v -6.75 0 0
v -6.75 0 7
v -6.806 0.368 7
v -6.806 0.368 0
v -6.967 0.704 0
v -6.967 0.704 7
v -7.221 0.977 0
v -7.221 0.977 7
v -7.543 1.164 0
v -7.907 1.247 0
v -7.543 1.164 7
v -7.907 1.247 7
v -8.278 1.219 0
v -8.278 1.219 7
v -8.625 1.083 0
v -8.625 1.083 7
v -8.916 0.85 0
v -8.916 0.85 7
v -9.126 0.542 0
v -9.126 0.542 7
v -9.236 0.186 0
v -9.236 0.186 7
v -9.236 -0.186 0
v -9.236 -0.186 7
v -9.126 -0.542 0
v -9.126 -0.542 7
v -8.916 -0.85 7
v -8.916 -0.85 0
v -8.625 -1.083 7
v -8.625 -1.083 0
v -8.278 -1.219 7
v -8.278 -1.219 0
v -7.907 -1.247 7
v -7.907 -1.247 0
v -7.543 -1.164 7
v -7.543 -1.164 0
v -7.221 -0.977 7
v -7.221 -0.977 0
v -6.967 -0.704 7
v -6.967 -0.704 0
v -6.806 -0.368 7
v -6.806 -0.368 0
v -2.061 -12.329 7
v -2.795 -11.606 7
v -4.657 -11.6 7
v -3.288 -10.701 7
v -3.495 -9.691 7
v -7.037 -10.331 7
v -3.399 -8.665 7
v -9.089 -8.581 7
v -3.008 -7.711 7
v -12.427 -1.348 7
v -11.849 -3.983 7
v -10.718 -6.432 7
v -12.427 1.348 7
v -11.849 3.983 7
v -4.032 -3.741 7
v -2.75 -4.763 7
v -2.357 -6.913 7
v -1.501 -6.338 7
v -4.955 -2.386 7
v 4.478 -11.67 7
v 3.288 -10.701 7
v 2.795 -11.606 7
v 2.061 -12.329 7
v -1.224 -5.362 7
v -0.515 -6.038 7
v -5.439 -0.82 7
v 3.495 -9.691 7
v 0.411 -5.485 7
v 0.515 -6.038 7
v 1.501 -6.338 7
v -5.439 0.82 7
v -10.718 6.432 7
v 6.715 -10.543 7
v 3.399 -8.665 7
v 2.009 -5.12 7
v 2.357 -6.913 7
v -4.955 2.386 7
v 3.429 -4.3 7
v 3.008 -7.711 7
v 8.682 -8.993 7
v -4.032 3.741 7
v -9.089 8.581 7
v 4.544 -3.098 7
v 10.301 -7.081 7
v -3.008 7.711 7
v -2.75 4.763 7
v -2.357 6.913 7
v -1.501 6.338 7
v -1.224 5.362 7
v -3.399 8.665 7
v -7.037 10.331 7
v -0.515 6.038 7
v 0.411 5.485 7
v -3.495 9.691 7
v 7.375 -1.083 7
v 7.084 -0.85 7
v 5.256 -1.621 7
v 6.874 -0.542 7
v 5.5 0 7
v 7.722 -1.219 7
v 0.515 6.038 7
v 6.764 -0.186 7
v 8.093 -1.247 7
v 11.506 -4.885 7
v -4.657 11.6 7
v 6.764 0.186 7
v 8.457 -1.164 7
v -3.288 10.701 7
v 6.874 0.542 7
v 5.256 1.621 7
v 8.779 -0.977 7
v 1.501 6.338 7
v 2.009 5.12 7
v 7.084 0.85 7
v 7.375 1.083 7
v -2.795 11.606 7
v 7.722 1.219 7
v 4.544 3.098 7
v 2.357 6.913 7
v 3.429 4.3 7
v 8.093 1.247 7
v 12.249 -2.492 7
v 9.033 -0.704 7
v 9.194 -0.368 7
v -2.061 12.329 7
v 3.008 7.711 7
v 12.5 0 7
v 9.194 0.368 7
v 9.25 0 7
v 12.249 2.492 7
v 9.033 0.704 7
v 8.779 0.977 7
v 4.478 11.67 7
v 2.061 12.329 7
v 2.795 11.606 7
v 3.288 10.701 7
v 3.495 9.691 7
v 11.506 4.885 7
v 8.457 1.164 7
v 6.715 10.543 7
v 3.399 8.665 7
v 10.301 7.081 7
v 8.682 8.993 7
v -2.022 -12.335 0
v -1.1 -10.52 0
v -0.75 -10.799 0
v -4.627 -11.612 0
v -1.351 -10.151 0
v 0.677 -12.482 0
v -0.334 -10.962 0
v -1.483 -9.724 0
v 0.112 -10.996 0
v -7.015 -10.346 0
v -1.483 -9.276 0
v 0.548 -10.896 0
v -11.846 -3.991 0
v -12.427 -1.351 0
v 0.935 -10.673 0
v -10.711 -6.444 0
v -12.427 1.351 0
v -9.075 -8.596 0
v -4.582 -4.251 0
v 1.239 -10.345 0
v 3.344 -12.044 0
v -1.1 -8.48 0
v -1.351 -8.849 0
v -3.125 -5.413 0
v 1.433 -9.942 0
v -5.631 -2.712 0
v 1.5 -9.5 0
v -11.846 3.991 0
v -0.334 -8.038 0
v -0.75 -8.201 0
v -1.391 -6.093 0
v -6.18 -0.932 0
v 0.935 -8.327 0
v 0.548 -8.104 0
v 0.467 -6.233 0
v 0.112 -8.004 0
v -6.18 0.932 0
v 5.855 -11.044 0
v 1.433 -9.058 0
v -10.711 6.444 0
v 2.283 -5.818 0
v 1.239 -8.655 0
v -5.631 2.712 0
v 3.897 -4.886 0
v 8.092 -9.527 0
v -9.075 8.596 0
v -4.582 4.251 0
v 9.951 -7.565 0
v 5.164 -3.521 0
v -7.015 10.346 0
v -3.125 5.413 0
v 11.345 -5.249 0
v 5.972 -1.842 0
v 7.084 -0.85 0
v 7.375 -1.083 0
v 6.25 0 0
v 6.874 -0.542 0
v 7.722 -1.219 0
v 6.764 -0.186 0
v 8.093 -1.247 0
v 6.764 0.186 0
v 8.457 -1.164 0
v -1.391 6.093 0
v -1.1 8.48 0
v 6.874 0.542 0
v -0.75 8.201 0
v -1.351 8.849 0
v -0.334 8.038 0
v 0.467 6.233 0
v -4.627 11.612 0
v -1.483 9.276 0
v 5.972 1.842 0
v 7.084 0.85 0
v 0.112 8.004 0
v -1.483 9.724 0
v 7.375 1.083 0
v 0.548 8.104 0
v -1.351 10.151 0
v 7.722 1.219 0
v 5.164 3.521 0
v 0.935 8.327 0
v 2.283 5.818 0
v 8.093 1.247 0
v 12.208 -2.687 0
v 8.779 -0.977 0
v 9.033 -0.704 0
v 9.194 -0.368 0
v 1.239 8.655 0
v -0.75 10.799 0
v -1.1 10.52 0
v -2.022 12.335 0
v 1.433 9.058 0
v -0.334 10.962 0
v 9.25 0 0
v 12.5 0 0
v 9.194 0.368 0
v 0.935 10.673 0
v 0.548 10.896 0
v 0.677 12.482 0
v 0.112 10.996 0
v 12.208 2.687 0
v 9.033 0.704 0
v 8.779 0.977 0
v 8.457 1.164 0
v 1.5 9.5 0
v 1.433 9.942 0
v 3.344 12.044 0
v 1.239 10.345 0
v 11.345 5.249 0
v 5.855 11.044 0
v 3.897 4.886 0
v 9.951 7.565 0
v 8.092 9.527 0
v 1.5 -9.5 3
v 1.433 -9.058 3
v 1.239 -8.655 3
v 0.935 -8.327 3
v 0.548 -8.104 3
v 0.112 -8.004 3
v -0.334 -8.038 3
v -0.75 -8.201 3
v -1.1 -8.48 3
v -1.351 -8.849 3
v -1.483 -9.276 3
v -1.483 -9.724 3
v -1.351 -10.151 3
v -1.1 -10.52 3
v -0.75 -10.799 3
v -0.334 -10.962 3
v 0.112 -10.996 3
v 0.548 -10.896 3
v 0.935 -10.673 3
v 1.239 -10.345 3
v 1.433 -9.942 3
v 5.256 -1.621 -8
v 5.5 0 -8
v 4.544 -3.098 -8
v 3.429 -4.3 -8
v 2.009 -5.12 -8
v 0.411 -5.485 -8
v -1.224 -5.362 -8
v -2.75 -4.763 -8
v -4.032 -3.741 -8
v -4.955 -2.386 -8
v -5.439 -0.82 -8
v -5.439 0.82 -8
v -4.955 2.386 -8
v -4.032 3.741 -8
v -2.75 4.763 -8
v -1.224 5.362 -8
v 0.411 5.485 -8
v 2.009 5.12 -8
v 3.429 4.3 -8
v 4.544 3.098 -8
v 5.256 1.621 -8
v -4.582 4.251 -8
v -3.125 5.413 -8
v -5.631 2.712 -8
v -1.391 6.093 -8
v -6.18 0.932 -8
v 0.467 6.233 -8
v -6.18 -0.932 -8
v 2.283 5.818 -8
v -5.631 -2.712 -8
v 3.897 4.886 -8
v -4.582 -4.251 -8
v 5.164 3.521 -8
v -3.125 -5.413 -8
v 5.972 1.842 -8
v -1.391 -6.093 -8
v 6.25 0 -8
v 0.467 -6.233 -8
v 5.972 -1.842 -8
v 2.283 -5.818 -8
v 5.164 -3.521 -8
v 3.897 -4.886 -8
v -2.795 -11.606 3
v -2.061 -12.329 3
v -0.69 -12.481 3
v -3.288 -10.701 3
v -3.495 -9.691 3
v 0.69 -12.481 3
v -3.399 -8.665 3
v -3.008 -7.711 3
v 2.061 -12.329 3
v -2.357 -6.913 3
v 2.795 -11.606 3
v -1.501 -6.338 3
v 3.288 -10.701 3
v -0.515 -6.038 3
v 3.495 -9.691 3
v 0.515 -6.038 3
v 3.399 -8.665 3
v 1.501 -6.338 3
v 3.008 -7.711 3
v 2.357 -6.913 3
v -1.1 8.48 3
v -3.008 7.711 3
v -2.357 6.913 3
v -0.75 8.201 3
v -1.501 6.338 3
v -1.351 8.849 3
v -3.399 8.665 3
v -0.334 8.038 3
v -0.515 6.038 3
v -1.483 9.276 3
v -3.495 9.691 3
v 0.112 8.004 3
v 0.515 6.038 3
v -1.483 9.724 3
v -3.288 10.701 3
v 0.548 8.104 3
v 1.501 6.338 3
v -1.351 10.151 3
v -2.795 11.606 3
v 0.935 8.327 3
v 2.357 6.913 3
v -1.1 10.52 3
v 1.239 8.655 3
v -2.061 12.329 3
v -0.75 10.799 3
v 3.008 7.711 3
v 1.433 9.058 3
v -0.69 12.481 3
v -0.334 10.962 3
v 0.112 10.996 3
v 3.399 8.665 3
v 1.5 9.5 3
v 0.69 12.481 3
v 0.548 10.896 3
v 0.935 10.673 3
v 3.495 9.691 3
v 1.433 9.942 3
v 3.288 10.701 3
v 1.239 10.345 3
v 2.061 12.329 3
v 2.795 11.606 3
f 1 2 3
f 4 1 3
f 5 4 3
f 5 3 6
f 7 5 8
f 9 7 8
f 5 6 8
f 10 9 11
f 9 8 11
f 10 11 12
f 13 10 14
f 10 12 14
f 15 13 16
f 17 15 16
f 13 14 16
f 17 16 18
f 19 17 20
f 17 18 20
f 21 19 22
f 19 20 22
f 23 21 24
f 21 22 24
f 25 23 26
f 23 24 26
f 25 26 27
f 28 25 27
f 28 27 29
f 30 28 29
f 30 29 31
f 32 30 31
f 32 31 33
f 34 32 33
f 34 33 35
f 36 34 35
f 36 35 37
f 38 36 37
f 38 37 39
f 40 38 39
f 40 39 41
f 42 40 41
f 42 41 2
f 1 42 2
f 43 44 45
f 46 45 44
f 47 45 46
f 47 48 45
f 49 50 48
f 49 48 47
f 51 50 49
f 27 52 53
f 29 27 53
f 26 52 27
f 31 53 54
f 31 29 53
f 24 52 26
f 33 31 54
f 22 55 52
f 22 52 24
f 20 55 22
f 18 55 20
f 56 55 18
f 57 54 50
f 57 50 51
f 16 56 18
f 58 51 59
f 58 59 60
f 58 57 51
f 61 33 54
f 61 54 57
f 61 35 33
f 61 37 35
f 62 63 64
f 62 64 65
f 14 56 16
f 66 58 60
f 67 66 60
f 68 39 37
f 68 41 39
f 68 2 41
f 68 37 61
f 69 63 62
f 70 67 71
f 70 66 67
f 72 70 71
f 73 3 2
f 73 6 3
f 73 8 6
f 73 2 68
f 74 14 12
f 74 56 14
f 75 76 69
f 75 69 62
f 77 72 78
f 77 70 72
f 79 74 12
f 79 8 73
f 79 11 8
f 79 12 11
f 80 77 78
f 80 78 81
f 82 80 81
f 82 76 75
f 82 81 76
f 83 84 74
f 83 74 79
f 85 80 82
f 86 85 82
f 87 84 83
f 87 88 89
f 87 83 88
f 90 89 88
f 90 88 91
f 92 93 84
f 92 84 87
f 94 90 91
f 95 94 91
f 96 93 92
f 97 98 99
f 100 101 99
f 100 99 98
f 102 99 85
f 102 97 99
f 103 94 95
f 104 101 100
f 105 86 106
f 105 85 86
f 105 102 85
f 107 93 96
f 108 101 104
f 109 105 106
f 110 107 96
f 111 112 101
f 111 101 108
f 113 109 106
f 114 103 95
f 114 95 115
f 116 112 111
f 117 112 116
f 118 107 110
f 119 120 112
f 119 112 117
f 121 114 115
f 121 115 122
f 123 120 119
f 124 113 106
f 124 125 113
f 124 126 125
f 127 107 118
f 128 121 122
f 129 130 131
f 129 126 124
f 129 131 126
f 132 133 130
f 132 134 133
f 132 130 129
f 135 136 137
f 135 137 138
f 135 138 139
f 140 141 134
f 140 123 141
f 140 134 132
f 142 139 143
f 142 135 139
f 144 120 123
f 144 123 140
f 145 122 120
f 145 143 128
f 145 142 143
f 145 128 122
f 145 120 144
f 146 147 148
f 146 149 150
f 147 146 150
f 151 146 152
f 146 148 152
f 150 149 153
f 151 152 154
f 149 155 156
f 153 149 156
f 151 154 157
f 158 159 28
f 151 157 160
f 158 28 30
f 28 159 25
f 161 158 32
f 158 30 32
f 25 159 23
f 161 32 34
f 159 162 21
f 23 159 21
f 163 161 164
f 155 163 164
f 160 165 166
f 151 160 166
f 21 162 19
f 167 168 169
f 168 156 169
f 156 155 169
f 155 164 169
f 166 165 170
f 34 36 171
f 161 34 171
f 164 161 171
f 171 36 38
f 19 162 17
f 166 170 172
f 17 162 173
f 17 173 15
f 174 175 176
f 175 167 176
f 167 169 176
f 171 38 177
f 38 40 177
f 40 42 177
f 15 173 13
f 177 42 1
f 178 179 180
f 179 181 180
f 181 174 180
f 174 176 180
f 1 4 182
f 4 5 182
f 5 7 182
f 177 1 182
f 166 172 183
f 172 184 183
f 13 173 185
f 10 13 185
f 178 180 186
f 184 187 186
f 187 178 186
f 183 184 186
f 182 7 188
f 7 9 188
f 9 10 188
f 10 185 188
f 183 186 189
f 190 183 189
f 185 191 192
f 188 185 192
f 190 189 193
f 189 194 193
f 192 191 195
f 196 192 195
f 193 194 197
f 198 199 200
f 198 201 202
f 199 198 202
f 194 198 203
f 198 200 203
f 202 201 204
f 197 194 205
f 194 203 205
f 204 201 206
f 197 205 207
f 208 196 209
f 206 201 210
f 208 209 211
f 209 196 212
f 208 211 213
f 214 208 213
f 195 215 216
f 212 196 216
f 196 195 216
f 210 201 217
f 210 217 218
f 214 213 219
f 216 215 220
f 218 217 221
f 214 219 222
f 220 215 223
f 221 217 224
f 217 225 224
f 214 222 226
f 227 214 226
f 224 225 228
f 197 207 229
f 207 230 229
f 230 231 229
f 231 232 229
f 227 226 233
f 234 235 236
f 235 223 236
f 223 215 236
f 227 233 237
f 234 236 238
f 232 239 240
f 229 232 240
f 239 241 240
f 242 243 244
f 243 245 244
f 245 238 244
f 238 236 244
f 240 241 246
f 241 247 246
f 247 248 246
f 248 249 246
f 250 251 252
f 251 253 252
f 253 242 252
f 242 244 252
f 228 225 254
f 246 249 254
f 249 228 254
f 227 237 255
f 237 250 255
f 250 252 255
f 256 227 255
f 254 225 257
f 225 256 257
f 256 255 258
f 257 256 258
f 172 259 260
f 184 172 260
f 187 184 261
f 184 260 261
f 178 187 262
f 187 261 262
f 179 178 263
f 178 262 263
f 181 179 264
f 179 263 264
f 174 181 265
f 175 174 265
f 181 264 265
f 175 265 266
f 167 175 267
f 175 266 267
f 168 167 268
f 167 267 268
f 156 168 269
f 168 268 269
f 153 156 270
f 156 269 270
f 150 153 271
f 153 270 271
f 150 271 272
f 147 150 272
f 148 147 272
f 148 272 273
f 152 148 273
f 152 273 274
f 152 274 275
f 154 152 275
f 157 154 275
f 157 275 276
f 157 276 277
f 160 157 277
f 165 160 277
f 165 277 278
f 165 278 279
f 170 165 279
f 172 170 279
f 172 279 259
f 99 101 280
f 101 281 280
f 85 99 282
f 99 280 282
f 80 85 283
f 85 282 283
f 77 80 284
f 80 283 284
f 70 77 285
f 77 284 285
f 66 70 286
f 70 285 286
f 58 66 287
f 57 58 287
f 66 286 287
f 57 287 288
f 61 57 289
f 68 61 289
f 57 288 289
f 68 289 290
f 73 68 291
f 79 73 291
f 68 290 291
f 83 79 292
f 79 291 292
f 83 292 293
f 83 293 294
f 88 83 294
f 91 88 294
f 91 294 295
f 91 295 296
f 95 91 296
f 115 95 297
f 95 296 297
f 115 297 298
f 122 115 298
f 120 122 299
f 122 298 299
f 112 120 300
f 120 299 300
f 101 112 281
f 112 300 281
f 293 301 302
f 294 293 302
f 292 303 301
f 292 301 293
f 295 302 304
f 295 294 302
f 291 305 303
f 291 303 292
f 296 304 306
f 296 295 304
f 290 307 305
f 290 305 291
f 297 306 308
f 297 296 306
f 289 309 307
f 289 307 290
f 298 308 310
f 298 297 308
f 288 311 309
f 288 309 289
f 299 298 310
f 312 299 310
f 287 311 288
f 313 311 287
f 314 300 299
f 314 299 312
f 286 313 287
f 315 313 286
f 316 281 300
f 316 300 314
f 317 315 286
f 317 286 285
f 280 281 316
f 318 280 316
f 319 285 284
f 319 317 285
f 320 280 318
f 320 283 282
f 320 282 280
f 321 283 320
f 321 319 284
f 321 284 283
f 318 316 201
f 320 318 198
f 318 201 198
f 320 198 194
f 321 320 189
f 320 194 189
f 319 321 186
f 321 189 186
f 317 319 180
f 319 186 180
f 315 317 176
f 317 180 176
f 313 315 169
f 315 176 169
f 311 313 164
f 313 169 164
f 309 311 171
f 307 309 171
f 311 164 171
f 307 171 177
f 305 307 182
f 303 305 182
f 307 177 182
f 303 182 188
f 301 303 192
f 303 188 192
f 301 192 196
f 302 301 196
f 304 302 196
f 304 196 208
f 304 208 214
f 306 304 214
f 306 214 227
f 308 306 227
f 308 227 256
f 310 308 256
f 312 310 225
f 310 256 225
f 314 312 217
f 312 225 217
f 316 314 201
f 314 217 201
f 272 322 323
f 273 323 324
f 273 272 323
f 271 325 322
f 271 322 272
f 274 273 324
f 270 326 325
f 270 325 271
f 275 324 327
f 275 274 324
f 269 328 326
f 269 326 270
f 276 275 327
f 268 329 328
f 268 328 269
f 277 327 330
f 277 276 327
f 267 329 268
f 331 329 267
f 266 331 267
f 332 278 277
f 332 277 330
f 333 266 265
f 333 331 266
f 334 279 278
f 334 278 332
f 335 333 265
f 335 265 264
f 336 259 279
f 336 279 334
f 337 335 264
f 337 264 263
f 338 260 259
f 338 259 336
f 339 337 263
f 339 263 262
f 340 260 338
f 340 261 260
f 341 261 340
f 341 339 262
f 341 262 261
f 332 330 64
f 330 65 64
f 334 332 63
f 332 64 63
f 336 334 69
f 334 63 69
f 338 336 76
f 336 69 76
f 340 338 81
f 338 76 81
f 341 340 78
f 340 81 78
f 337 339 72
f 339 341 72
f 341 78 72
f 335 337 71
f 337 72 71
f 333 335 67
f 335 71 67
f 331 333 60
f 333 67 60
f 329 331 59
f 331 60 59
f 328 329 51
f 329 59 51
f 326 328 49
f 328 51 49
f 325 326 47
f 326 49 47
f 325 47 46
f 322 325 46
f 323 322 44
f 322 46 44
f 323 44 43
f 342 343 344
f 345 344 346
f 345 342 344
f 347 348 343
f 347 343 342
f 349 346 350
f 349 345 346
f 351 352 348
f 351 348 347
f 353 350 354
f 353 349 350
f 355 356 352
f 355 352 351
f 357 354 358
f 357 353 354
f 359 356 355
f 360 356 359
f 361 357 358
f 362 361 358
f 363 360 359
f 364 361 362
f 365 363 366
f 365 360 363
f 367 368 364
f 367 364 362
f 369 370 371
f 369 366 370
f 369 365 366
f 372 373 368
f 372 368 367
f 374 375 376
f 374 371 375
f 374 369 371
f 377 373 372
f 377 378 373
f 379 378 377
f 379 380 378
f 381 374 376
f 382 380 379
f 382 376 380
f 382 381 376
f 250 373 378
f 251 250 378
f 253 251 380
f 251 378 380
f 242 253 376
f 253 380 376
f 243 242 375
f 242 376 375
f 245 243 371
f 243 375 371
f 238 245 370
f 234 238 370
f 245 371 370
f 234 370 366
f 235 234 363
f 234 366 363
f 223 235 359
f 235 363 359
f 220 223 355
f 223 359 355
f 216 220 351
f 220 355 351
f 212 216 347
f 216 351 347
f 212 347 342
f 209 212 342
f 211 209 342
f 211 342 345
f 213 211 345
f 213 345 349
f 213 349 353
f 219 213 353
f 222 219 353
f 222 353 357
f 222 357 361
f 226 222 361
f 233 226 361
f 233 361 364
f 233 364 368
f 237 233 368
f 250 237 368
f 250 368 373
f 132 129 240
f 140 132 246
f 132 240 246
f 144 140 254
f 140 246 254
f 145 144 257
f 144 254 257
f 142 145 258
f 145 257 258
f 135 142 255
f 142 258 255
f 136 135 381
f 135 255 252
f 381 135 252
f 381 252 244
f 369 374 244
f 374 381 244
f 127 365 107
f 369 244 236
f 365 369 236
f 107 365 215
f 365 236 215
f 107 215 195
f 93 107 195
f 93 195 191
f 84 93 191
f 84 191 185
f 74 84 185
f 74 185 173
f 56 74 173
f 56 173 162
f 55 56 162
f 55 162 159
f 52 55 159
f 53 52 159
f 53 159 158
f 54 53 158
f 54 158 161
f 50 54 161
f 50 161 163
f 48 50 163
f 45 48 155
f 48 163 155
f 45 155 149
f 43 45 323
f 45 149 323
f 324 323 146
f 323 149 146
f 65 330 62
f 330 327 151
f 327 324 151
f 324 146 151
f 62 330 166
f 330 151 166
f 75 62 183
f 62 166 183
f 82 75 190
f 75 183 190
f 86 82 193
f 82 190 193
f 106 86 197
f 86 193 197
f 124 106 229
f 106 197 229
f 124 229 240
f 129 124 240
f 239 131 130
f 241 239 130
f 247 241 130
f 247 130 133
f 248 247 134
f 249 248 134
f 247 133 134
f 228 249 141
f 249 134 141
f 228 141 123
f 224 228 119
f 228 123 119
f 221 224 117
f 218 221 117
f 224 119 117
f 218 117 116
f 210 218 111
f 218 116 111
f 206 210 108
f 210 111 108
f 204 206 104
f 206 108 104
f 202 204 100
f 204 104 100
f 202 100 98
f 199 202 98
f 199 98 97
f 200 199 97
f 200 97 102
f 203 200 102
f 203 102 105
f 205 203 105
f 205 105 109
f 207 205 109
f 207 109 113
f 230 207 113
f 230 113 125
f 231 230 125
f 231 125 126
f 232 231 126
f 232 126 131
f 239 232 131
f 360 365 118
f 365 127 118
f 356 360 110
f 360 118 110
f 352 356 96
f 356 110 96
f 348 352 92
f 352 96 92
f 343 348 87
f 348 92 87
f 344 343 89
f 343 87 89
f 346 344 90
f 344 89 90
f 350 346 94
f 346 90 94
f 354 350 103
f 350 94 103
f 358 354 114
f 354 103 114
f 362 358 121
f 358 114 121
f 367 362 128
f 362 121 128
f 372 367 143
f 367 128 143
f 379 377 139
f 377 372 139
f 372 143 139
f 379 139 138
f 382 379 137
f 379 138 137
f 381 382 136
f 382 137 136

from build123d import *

# Parameters (mm, degrees)
F0_R          = 12.5
F1_DEPTH      = 7
F2_R          = 1.5
F3_DEPTH      = 7.001
F4_R          = 3.5
F5_DEPTH      = 4
F6_R          = 6.25
F6_R_2        = 5
F7_DEPTH      = 8
F8_R          = 5.5
F9_DEPTH      = 7.001
F9_DEPTH_BACK = 8.001
F10_R         = 1.25
F11_DEPTH     = 15.001


with BuildPart() as f1:
    # F0 (on Top) → F1 (new body)
    with BuildSketch(Plane.XY):
        Circle(F0_R)
    extrude(amount=F1_DEPTH)

    # F2 (on face) → F3 (cut, through all)
    with BuildSketch(Plane.XY.offset(7)):
        with Locations((0, 9.5)):
            Circle(F2_R)
        with Locations((0, -9.5)):
            Circle(F2_R)
    extrude(amount=-F3_DEPTH, mode=Mode.SUBTRACT)

    # F4 (on face) → F5 (cut, through all)
    with BuildSketch(Plane.XY.offset(7)):
        with Locations((0, 9.5)):
            Circle(F4_R)
        with Locations((0, -9.5)):
            Circle(F4_R)
    extrude(amount=-F5_DEPTH, mode=Mode.SUBTRACT)

    # F6 (on face) → F7 (join)
    with BuildSketch(Plane(origin=(0, 0, 0), x_dir=(1, 0, 0), z_dir=(0, 0, -1))):
        Circle(F6_R)
        Circle(F6_R_2, mode=Mode.SUBTRACT)
    extrude(amount=F7_DEPTH)

    # F8 (on face) → F9 (cut, two sides)
    with BuildSketch(Plane(origin=(0, 0, 0), x_dir=(1, 0, 0), z_dir=(0, 0, -1))) as f9_sk:
        Circle(F8_R)
    extrude(amount=-F9_DEPTH, mode=Mode.SUBTRACT)
    extrude(f9_sk.sketch, amount=F9_DEPTH_BACK, mode=Mode.SUBTRACT)

    # F10 (on face) → F11 (cut, through all)
    with BuildSketch(Plane.XY.offset(7)):
        with Locations((8, 0)):
            Circle(F10_R)
        with Locations((-8, 0)):
            Circle(F10_R)
    extrude(amount=-F11_DEPTH, mode=Mode.SUBTRACT)


solid = f1.part
